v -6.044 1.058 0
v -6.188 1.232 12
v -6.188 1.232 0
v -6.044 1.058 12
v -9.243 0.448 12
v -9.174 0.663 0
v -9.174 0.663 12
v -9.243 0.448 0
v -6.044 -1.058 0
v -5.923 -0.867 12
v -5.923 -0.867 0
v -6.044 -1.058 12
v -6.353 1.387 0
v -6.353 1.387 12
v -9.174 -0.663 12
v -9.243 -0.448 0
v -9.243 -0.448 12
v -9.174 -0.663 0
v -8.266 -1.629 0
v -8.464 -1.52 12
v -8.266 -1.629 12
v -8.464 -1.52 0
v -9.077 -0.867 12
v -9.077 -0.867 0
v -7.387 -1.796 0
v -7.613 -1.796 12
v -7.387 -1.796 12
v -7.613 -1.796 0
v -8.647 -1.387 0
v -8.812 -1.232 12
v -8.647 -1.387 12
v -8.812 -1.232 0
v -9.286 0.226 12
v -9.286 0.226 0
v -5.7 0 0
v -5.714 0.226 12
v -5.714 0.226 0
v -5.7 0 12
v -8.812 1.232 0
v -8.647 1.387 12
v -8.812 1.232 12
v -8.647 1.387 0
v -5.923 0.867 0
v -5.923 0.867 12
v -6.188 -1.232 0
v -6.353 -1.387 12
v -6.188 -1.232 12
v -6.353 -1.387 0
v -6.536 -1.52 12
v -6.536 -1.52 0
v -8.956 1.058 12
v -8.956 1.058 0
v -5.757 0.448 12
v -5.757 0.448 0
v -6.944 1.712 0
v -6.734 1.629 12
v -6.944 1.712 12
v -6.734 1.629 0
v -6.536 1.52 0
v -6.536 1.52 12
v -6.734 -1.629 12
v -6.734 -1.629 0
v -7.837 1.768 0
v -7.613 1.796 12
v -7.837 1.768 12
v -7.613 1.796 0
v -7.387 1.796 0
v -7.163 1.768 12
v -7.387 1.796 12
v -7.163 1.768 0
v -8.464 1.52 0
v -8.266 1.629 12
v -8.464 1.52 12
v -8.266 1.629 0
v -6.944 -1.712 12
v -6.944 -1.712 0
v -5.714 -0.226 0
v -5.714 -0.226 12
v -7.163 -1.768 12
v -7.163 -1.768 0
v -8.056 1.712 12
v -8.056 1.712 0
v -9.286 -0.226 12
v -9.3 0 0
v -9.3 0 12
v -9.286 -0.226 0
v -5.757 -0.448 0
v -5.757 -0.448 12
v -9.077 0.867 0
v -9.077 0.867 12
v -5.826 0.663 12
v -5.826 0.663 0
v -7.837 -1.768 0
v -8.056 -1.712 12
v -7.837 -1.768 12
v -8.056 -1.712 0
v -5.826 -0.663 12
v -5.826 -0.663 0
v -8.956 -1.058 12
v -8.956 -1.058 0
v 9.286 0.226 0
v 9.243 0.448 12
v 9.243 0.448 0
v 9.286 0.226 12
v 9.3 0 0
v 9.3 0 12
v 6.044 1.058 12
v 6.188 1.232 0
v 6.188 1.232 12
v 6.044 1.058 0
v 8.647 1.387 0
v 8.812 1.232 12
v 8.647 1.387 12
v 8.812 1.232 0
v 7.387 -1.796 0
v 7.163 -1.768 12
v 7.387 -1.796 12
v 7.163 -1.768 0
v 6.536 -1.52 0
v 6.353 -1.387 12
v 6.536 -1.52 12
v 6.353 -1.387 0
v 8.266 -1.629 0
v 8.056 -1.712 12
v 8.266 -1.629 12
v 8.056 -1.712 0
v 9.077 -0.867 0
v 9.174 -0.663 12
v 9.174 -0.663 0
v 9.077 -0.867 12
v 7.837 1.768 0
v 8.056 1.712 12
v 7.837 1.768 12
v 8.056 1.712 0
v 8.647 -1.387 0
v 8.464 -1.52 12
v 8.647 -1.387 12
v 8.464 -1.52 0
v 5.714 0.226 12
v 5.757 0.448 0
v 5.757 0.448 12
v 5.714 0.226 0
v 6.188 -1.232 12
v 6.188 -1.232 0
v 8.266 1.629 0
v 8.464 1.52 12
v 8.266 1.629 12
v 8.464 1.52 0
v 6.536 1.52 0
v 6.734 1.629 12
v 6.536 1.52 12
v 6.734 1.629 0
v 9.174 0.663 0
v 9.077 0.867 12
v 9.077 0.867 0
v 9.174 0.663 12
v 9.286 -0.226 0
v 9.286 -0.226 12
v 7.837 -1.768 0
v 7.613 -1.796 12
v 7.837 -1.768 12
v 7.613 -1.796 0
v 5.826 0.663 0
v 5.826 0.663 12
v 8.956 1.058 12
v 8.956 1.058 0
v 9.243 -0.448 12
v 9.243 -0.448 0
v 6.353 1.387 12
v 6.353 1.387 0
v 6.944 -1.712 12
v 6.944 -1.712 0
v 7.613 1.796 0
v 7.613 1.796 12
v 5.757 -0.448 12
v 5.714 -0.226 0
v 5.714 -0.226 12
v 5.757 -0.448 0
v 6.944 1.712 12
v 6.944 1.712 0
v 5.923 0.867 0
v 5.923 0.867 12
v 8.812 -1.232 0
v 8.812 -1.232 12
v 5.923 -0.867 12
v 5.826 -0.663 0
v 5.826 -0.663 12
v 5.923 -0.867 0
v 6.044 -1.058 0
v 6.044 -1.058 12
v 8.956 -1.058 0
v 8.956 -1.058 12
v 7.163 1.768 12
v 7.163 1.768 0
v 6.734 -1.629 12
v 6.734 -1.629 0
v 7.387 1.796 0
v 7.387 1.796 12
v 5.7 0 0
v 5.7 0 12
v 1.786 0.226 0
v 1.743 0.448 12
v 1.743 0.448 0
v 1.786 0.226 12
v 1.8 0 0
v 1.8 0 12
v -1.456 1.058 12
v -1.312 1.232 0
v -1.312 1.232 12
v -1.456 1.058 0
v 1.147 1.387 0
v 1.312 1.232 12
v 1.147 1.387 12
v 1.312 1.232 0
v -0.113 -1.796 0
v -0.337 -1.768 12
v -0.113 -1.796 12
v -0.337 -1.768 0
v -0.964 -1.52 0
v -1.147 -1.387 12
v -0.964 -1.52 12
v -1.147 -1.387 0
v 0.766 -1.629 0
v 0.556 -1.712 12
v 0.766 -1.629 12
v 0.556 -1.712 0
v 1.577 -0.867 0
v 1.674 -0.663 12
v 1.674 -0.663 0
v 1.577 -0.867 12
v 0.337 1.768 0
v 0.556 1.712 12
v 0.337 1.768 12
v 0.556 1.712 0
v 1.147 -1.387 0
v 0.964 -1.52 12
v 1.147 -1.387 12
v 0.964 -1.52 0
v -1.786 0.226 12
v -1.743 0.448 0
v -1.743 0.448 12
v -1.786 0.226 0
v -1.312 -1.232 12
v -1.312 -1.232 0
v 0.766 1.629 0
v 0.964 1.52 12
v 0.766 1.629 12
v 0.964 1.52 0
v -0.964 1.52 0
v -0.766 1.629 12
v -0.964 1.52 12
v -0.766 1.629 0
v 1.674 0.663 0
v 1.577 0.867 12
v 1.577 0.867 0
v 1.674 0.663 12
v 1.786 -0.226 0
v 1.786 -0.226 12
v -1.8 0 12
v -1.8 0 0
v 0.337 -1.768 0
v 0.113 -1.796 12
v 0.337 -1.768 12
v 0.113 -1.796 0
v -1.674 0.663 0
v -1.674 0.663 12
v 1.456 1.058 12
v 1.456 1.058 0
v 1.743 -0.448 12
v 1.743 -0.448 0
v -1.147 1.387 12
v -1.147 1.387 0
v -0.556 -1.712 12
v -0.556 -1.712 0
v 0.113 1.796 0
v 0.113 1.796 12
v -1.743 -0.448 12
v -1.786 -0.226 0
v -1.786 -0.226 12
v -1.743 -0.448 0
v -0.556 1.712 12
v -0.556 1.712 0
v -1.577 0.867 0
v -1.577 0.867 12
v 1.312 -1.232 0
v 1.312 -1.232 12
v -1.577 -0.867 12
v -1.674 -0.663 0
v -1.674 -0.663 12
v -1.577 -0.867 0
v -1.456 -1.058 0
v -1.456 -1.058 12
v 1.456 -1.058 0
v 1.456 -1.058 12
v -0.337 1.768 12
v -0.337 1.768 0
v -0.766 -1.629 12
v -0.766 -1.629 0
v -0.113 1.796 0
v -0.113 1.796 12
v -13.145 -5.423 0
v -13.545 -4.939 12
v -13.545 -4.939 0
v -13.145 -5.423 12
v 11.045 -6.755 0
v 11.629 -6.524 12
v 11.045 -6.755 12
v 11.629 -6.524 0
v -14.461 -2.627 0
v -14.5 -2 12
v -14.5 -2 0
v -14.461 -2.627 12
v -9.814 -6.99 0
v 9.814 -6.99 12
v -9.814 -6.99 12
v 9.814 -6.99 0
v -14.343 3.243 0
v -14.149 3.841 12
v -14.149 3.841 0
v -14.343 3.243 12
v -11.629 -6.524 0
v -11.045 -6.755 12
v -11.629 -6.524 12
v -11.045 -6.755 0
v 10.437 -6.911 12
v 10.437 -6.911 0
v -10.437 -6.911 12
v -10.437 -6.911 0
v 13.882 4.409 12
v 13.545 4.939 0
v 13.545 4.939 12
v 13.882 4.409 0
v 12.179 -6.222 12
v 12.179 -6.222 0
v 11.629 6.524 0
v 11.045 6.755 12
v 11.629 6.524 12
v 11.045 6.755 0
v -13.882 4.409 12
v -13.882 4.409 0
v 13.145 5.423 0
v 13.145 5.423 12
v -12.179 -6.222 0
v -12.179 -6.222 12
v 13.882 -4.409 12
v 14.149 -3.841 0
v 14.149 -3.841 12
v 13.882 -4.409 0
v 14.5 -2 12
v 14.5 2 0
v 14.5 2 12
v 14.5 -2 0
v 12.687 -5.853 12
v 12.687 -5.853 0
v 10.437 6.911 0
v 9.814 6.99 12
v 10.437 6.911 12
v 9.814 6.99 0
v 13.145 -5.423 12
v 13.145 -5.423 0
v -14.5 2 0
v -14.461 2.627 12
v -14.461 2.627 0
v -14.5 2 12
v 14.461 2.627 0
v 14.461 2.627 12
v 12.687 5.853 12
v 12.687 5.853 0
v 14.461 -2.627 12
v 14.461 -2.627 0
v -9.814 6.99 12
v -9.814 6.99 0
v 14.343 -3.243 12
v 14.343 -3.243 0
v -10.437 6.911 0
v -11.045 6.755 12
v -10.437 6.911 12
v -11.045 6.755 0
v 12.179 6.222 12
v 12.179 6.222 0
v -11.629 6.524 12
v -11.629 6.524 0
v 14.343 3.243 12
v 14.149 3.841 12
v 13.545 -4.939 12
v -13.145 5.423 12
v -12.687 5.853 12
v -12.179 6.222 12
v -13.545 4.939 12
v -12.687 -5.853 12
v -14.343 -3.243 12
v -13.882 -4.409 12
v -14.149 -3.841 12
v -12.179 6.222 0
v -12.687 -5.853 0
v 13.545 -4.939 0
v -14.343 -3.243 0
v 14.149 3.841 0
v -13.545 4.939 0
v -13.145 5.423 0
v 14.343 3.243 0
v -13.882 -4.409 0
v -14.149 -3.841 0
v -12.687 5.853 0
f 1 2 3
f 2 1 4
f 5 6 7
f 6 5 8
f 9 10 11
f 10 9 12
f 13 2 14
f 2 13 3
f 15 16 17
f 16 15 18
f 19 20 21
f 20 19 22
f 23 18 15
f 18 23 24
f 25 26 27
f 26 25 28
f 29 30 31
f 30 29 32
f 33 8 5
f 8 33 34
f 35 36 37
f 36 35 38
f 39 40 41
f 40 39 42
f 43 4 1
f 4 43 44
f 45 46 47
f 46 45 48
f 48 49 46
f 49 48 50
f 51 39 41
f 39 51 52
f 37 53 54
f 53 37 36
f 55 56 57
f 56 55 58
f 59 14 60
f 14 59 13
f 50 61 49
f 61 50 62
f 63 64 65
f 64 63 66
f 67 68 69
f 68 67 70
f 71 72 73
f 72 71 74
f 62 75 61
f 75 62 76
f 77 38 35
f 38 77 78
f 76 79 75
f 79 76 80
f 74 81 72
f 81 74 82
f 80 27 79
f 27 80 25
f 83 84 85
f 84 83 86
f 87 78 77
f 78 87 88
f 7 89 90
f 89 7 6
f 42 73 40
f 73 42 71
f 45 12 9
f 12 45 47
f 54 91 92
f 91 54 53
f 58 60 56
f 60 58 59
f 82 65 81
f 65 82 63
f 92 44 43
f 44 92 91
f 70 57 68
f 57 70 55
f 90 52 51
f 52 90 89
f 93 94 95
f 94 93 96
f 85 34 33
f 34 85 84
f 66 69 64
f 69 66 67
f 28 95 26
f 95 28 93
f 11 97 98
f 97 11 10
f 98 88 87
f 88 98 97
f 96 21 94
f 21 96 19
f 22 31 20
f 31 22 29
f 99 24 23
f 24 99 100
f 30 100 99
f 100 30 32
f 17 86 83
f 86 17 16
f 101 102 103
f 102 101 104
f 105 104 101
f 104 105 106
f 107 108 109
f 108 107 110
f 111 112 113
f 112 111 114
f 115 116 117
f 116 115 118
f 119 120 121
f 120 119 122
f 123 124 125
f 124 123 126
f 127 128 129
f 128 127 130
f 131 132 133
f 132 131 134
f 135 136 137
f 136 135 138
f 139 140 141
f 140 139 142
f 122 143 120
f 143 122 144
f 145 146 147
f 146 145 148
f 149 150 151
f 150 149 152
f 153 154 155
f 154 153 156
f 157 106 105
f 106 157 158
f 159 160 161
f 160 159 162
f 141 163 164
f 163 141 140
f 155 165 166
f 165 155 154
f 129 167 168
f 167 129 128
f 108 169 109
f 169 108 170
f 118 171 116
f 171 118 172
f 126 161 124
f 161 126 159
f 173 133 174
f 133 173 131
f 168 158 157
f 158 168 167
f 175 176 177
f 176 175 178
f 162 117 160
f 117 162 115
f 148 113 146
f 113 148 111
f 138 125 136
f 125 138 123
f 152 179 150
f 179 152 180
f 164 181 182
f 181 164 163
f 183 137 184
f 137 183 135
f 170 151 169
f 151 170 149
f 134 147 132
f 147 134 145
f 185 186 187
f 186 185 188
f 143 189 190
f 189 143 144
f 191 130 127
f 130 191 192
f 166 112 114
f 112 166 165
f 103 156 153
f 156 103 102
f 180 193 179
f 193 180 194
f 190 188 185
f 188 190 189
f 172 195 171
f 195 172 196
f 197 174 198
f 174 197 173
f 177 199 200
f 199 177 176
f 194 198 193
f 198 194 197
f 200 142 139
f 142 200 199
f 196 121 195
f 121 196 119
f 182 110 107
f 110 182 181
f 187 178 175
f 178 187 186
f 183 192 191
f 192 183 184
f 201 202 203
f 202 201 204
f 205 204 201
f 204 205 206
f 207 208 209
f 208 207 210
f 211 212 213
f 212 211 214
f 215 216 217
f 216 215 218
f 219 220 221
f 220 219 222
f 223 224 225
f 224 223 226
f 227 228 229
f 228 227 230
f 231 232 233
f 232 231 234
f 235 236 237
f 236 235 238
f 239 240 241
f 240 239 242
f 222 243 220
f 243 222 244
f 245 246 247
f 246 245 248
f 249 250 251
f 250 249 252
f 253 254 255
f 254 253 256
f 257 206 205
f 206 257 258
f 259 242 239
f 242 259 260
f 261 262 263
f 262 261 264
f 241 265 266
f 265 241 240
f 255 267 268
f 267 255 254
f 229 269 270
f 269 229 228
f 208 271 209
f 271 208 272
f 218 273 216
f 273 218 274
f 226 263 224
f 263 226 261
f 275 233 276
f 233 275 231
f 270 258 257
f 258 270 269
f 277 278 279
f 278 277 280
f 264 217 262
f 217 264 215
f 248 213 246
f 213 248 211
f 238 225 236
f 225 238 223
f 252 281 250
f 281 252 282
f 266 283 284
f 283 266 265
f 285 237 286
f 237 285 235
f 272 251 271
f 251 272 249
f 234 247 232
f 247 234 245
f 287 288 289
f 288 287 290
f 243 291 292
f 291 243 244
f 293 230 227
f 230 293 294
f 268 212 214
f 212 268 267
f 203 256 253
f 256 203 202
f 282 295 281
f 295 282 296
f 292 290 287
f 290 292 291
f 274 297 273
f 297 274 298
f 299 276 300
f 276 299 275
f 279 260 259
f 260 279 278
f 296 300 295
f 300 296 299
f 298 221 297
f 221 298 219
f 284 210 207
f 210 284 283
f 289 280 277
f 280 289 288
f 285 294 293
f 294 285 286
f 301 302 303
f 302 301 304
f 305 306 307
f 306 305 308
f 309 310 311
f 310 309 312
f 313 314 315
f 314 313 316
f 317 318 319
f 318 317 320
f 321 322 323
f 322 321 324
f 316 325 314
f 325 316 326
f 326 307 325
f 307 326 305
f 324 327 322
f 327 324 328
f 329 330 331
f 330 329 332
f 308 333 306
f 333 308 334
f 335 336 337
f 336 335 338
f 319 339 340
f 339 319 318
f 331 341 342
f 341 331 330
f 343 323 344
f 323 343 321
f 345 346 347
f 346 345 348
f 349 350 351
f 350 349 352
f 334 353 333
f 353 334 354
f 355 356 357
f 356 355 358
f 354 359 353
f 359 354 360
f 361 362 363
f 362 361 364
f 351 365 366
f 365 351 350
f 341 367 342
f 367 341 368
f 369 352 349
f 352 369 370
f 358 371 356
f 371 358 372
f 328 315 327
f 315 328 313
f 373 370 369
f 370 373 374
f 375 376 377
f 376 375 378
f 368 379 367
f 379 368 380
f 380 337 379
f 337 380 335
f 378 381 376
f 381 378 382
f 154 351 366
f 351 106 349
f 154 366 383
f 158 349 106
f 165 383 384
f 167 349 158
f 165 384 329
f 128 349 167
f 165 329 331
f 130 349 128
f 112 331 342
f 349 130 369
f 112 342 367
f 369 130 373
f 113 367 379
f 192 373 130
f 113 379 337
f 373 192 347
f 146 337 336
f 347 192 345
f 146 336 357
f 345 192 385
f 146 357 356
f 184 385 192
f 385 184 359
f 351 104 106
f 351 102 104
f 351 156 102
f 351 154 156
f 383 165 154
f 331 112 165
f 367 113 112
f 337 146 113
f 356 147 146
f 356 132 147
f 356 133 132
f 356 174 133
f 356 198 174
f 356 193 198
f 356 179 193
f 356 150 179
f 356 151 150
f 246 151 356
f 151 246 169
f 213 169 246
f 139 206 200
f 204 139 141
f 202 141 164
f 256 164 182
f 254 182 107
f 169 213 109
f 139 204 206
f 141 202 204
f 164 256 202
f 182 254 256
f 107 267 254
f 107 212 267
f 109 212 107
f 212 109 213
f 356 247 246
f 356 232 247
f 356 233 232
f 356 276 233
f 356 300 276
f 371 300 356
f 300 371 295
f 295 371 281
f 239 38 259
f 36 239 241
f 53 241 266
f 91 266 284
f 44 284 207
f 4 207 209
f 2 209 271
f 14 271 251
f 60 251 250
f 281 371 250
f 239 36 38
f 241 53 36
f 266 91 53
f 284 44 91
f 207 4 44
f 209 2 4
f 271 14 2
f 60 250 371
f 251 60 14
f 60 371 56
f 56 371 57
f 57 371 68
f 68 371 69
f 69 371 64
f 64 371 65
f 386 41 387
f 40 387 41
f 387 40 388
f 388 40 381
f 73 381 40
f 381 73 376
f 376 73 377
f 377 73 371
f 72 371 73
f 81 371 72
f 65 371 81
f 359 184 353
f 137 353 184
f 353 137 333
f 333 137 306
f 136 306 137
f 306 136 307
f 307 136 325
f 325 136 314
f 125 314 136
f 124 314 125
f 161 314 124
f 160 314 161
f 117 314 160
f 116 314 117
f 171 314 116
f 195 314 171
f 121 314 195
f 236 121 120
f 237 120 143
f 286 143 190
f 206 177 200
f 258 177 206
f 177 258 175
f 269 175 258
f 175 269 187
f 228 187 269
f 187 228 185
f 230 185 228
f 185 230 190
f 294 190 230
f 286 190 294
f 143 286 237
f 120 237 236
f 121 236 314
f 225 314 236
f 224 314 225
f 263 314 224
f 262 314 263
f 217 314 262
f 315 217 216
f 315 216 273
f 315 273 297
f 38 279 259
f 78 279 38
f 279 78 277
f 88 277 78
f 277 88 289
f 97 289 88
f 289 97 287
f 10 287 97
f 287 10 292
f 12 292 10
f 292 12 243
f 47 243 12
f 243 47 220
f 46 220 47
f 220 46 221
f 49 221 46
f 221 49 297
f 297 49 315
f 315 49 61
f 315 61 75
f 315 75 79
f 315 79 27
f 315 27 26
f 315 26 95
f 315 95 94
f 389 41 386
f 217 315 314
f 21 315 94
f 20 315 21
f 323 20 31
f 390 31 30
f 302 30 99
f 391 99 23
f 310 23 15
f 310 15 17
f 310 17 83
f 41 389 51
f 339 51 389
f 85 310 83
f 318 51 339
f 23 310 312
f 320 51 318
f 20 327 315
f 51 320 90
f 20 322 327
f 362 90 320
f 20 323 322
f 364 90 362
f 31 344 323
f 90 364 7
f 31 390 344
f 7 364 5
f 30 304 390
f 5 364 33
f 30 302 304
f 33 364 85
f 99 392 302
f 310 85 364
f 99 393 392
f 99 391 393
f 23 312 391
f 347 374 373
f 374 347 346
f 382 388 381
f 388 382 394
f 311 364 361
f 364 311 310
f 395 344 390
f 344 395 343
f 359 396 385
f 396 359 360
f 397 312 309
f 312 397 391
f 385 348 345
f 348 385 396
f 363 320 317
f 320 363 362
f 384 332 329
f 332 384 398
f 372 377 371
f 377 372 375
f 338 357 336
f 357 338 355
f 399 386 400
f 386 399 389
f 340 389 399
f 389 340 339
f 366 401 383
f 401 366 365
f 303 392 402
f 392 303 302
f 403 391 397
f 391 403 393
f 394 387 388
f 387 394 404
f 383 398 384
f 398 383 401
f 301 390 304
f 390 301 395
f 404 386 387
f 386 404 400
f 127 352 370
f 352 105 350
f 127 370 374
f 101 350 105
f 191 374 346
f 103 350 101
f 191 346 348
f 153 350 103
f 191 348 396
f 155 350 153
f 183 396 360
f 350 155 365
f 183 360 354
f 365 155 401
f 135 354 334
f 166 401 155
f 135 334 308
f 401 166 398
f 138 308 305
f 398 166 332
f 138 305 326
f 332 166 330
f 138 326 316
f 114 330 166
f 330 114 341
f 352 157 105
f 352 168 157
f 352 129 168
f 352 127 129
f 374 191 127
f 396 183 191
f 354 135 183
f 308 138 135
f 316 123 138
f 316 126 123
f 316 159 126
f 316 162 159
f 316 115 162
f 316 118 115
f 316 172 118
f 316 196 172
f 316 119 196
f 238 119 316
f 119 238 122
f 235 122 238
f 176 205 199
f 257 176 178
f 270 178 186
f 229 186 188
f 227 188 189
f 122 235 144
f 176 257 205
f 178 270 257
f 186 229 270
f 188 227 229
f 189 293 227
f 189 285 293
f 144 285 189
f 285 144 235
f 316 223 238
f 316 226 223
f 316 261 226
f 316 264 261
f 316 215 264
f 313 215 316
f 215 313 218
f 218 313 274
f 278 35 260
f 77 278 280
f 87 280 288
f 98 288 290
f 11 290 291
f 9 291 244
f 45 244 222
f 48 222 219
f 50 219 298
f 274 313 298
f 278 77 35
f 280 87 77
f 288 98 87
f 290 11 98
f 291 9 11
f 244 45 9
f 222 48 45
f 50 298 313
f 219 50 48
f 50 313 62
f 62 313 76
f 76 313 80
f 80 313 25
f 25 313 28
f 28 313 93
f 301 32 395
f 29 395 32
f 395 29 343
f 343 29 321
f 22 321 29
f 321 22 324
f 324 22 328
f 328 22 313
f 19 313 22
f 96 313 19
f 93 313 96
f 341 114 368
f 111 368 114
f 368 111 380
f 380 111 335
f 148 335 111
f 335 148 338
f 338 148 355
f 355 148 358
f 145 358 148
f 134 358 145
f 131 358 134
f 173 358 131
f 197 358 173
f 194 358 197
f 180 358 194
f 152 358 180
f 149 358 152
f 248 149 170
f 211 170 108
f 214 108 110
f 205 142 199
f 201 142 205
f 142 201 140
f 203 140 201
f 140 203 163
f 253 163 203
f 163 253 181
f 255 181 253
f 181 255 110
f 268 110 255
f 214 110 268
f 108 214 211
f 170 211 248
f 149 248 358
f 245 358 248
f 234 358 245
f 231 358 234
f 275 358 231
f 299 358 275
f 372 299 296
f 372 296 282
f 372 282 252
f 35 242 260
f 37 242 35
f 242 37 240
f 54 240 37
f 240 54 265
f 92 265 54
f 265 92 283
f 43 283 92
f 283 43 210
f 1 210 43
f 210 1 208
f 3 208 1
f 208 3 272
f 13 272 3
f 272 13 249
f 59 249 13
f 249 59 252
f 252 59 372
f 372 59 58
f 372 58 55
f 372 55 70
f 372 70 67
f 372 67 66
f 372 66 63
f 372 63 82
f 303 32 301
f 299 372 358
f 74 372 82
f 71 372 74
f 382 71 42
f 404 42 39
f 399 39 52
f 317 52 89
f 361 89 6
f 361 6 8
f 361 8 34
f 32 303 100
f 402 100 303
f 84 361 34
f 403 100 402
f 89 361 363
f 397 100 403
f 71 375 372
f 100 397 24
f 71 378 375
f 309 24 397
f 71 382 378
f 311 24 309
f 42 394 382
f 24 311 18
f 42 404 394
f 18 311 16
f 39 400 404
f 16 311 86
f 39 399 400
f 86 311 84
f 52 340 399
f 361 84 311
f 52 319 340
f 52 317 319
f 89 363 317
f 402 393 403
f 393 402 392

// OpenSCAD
$fn = 50;


difference() {
	union() {
		hull() {
			translate(v = [-9.5000000000, 2.0000000000, 0]) {
				cylinder(h = 12, r = 5);
			}
			translate(v = [9.5000000000, 2.0000000000, 0]) {
				cylinder(h = 12, r = 5);
			}
			translate(v = [-9.5000000000, -2.0000000000, 0]) {
				cylinder(h = 12, r = 5);
			}
			translate(v = [9.5000000000, -2.0000000000, 0]) {
				cylinder(h = 12, r = 5);
			}
		}
	}
	union() {
		translate(v = [-7.5000000000, 0.0000000000, 0]) {
			translate(v = [0, 0, -100]) {
				cylinder(h = 200, r = 1.8000000000);
			}
		}
		translate(v = [7.5000000000, 0.0000000000, 0]) {
			translate(v = [0, 0, -100]) {
				cylinder(h = 200, r = 1.8000000000);
			}
		}
		translate(v = [-7.5000000000, 0.0000000000, 0]) {
			translate(v = [0, 0, -100]) {
				cylinder(h = 200, r = 1.8000000000);
			}
		}
		translate(v = [0, 0, -100]) {
			cylinder(h = 200, r = 1.8000000000);
		}
		translate(v = [7.5000000000, 0.0000000000, 0]) {
			translate(v = [0, 0, -100]) {
				cylinder(h = 200, r = 1.8000000000);
			}
		}
	}
}
